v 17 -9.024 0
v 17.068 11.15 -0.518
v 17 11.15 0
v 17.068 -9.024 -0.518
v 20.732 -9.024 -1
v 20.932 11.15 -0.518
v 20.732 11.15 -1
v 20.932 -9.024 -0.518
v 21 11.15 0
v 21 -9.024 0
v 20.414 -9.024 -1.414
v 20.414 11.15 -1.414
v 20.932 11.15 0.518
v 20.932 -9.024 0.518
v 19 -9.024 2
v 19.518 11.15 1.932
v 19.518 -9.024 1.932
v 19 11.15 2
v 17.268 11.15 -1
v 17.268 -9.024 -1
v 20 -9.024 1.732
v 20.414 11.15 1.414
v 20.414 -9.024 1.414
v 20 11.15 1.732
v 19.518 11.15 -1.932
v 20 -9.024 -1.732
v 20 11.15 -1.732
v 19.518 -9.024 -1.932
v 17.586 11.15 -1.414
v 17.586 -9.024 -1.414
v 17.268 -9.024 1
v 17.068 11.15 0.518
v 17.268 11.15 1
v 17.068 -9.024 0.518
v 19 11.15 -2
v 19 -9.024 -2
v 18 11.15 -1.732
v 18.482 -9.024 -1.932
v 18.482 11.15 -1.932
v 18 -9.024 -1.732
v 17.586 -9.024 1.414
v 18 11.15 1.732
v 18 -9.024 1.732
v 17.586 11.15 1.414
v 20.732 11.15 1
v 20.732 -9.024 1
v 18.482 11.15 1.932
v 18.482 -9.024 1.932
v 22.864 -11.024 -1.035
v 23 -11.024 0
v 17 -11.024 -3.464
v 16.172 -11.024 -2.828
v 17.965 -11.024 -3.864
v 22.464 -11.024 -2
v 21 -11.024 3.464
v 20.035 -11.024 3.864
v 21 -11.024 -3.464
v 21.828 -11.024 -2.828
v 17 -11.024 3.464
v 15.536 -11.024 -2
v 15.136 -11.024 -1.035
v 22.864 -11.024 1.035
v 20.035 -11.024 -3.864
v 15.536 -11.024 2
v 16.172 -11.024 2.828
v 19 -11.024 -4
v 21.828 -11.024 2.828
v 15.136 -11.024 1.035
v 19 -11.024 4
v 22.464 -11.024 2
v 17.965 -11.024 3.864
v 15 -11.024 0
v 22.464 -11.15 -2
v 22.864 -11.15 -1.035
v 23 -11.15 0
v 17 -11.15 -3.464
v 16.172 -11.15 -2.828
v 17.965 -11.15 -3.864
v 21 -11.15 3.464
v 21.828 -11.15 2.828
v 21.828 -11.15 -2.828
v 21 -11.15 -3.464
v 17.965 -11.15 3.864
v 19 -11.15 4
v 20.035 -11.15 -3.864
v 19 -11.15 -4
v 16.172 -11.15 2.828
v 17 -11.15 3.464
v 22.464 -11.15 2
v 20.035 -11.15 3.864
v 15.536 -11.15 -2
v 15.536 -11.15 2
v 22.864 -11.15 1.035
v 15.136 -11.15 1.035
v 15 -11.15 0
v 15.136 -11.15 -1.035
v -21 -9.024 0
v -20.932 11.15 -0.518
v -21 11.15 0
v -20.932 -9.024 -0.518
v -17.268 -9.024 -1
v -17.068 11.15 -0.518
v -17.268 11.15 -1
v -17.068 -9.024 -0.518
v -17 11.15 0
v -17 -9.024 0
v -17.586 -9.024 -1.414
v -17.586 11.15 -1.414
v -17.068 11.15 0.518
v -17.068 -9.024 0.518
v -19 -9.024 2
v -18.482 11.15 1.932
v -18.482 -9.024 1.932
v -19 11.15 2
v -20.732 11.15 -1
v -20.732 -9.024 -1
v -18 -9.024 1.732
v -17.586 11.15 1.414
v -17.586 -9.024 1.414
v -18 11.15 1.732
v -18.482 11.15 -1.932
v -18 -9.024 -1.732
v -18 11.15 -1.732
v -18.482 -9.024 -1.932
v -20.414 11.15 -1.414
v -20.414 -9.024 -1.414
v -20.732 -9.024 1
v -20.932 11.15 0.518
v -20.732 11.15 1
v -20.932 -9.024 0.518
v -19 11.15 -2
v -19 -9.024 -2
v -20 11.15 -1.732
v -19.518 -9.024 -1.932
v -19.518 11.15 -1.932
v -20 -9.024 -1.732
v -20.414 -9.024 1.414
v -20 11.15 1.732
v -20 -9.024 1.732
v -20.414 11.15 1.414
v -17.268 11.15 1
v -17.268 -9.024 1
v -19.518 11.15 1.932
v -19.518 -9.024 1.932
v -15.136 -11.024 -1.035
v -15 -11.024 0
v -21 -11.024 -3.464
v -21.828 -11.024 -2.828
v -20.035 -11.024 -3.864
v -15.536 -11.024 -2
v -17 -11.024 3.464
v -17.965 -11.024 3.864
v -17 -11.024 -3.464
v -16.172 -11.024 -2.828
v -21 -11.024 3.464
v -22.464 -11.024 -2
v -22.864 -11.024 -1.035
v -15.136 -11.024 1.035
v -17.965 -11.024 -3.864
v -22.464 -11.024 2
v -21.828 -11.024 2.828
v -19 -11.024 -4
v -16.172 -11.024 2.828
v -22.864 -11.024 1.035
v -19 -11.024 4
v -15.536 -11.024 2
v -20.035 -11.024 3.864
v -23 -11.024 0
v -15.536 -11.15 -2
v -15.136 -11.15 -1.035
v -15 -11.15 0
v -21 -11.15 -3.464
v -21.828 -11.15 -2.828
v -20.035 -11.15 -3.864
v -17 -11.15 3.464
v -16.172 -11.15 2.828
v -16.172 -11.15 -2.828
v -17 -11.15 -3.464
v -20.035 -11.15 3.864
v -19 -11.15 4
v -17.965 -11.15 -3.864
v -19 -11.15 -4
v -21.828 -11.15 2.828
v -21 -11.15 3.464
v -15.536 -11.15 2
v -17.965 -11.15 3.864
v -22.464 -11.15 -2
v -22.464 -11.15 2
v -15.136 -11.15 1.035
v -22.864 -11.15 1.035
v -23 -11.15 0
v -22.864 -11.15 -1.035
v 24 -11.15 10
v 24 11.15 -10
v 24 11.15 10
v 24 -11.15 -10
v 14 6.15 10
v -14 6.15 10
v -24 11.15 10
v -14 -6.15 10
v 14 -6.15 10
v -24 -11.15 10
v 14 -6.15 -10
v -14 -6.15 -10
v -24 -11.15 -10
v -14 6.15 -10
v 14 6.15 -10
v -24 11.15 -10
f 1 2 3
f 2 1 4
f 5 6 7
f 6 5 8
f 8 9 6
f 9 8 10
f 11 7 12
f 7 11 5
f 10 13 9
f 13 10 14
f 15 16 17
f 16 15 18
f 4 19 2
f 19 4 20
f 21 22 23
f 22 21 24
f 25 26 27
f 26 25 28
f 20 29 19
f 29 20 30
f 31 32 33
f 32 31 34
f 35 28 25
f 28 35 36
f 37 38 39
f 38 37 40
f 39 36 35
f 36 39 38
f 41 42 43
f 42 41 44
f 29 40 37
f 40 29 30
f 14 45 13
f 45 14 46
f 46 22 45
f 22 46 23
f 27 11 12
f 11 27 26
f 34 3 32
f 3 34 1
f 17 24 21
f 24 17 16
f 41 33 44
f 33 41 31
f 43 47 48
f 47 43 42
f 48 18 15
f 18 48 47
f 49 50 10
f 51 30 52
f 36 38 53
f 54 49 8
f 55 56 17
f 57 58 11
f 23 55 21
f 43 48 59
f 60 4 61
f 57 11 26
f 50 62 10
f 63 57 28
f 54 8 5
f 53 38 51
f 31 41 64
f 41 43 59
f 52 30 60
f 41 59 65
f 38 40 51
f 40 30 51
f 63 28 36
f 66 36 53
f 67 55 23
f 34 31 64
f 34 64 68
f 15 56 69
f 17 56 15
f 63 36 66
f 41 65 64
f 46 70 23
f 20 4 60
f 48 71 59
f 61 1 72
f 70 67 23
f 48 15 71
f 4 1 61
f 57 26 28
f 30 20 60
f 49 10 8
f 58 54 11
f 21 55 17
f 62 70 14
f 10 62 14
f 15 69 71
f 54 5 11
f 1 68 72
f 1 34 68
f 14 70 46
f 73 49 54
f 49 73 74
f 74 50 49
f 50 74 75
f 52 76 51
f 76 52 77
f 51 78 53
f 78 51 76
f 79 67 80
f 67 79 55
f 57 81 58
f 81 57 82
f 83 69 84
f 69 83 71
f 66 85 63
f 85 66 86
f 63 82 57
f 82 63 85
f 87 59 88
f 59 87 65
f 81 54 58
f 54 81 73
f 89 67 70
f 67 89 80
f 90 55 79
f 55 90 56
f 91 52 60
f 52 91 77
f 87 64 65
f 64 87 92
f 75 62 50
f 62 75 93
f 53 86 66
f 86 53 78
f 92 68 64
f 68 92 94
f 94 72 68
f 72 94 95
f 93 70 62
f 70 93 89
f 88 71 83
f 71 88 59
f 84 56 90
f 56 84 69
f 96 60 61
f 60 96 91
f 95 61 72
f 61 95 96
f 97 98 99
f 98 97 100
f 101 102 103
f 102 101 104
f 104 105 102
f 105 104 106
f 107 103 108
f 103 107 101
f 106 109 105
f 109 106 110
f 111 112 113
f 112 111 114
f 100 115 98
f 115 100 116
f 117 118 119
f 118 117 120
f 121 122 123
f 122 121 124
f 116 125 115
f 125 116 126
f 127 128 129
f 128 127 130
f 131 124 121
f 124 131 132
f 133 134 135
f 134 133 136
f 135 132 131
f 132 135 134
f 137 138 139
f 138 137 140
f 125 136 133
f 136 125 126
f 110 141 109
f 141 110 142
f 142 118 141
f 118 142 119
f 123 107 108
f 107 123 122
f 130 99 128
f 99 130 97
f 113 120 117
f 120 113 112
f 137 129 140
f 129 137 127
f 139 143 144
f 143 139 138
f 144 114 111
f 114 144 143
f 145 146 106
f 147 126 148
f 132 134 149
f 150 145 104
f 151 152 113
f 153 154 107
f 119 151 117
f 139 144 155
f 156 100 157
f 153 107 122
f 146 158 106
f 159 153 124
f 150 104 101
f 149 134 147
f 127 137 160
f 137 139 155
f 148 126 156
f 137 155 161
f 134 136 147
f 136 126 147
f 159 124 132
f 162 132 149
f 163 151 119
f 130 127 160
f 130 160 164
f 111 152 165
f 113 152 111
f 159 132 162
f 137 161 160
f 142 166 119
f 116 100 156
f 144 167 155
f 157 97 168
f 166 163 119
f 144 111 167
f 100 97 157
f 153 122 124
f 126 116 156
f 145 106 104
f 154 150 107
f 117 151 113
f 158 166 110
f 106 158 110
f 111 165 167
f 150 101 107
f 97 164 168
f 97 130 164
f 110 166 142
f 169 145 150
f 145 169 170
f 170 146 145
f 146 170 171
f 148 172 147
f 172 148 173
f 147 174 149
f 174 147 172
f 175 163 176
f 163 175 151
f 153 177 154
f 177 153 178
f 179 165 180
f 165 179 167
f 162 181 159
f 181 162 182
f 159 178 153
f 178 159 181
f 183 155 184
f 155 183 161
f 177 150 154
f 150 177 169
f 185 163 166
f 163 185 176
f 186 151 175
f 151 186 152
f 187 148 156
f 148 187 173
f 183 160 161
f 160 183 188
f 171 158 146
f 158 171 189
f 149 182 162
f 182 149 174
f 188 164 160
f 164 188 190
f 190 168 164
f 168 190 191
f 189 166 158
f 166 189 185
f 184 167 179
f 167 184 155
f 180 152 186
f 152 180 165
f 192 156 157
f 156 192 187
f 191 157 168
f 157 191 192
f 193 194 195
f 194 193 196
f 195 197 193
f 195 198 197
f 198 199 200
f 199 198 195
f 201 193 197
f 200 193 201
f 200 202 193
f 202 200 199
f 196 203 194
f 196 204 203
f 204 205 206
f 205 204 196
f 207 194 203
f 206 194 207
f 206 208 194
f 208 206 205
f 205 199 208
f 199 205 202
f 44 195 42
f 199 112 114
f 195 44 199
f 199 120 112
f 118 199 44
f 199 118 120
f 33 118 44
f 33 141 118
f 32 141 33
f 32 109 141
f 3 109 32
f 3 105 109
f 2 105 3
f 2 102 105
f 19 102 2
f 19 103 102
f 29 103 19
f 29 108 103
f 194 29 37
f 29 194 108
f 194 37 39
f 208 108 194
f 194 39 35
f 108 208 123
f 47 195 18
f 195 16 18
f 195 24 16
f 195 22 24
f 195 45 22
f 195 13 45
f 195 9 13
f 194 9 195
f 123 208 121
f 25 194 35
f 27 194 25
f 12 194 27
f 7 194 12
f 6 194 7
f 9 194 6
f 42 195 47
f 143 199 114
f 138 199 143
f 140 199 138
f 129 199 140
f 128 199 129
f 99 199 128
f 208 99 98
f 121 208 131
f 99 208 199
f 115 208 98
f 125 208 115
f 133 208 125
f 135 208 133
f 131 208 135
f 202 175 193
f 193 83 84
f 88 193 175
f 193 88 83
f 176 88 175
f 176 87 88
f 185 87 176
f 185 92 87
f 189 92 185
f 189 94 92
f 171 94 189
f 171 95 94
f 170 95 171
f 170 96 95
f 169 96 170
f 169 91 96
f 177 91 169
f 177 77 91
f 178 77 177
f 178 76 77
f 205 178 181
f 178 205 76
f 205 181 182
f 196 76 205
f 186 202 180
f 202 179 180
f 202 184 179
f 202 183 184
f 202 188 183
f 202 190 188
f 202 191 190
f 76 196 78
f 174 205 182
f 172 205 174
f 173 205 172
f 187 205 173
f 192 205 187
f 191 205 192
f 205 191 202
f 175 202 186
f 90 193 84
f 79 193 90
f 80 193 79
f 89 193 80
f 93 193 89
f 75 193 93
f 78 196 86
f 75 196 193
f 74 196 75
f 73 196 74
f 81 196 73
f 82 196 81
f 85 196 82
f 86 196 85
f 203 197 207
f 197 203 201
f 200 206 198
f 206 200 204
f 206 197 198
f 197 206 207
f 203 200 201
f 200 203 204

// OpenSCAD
// Bull nose pliers holder 3D Design

// Copyright (c) 2014 by Jeremy Bennett <jeremy.bennett@embecosm.com>

// Crimp holder 3D Design is licensed under a Creative Commons
// Attribution-ShareAlike 3.0 Unported License.

// You should have received a copy of the license along with this work.  If not,
// see <http://creativecommons.org/licenses/by-sa/3.0/>.

// -----------------------------------------------------------------------------


use <MCAD/regular_shapes.scad>


// A screw hole with a countersink
module screwhole (bore, length) {
	iota = length / 100;
	half_length = length / 2 + iota;
	full_length = half_length * 2;
	union () {
		cylinder (r = bore / 2, h = full_length, center = true, $fn = 24);
		translate (v = [0, 0, -half_length + bore / 4 + bore / 10])
			cylinder (r1 = bore, r2 = bore / 2, h = bore / 2, center = true, $fn = 24);
		translate (v = [0, 0, -half_length + bore / 20])
			cylinder (r = bore, h = bore / 10, center = true, $fn = 24);
	}
}


// A screw hole for a screw parallel with the Y axis
module screwhole_y (bore, length, x_off, z_off) {
	translate (v = [x_off, 0, z_off])
		rotate (a = [-90, 0, 0])
			screwhole (bore = bore, length = length);
}


// Support with screwholes
module tool_support () {
	back_thickness = 5;
	front_thickness = 5;
	side_thickness = 10;
	hole_width = 28;
	hole_depth = 12.3;
	block_width = hole_width + side_thickness * 2;
	block_depth = hole_depth + back_thickness + front_thickness;
	height = 20;
	screw_x_off = (hole_width + side_thickness) / 2;
	screw_z_off = 0;
	iota = 0.1;
	difference () {
		cube (size = [block_width, block_depth, height], center = true);
		// hole for strippers
		translate (v = [0, (back_thickness - front_thickness) / 2, 0])
			cube (size = [ hole_width, hole_depth, height + iota], center = true);
		// screw_holes
		screwhole_y (bore = 4, length = block_depth + iota, x_off =  screw_x_off,
		             z_off = screw_z_off);
		screwhole_y (bore = 4, length = block_depth + iota, x_off = -screw_x_off,
		             z_off = screw_z_off);
	}
}


tool_support ();
